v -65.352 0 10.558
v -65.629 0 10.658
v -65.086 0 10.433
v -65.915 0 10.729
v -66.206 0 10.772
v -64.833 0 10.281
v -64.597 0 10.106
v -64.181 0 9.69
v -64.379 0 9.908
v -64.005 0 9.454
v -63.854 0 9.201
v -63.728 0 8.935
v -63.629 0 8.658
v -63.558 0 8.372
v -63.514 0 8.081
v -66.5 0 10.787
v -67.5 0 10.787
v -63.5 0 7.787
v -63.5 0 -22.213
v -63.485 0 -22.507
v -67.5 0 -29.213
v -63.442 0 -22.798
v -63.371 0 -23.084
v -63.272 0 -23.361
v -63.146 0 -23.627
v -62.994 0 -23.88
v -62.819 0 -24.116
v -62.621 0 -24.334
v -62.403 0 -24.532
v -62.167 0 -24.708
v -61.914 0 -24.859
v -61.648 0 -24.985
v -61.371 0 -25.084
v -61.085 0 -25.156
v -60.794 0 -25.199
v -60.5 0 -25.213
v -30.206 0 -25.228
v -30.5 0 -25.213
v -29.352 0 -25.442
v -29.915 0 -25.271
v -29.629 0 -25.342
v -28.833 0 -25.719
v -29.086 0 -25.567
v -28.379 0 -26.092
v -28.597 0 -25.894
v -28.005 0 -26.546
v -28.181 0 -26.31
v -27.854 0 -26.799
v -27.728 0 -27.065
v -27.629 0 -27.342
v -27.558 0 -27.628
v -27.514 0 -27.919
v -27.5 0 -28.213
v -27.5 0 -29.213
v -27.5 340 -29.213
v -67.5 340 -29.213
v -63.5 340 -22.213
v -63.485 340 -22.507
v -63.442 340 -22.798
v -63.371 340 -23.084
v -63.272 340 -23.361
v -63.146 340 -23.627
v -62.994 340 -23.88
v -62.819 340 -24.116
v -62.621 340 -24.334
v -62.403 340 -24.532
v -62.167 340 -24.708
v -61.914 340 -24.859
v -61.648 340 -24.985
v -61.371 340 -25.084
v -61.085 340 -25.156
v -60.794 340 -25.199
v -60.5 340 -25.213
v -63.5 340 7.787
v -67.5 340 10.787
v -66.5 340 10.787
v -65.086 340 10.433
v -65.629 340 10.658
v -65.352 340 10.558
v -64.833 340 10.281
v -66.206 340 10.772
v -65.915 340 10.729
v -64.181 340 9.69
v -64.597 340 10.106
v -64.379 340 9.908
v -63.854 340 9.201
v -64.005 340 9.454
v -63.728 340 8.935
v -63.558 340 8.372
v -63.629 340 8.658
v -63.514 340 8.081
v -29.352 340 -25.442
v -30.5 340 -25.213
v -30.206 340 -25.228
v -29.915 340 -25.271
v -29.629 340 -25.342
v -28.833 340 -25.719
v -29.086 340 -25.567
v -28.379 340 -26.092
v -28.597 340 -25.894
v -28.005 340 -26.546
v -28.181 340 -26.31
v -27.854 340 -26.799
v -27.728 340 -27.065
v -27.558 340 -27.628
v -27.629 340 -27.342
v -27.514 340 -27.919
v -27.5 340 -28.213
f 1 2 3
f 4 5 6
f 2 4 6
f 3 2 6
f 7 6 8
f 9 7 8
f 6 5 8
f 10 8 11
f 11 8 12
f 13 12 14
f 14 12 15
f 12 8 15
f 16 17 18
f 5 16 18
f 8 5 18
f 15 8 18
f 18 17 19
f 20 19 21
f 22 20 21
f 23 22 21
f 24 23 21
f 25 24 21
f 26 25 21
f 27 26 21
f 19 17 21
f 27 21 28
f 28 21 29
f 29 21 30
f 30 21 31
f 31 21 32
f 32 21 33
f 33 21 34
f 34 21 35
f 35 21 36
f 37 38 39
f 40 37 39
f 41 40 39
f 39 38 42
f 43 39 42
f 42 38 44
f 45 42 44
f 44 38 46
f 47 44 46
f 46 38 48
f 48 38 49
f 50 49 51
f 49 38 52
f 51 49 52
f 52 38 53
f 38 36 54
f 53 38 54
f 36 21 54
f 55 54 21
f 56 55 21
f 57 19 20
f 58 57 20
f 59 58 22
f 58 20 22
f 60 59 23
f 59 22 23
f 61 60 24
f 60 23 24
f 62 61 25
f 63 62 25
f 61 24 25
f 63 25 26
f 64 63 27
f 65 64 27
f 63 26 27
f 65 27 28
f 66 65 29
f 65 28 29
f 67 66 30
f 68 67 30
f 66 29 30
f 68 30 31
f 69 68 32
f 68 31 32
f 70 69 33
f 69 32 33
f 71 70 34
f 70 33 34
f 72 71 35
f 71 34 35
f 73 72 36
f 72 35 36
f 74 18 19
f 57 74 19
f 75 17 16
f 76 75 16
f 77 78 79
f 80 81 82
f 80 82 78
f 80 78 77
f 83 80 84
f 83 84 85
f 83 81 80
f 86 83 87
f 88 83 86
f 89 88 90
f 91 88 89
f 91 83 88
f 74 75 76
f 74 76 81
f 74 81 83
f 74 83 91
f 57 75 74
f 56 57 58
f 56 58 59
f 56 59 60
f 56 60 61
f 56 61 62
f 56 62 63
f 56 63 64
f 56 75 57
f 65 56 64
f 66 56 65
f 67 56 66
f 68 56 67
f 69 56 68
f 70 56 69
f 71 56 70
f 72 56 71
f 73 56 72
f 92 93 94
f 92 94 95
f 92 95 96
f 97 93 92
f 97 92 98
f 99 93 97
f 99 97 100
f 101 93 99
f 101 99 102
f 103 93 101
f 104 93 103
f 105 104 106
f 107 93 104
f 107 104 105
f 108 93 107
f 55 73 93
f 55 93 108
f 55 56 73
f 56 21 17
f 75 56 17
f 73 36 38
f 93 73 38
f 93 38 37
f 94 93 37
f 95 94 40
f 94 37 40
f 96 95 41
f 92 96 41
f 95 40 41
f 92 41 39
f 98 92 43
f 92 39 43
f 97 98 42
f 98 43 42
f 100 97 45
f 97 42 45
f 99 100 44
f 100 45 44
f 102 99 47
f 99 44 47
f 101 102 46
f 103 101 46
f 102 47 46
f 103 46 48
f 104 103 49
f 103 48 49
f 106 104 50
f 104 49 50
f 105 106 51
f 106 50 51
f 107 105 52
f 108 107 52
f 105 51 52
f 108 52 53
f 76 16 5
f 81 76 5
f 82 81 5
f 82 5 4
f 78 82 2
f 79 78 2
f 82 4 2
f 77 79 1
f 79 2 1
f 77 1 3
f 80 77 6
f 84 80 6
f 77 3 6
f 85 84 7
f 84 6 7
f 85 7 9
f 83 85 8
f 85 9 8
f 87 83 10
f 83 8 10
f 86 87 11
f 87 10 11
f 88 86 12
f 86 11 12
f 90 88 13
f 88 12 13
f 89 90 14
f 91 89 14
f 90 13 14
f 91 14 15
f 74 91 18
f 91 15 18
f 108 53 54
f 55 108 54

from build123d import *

# Parameters (mm, degrees)
BOSS_EXTRUDE1_DEPTH = 340


with BuildPart() as part:
    # Sketch1 → Boss-Extrude1 (new body)
    with BuildSketch(Plane(origin=(0, 0, 0), x_dir=(1, 0, 0), z_dir=(0, 1, 0))):
        with BuildLine():
            Line((-27.499872145, 29.213153277), (-67.499872145, 29.213153277))
            Line((-67.499872145, 29.213153277), (-67.499872145, -10.786846723))
            Line((-67.499872145, -10.786846723), (-66.499872145, -10.786846723))
            ThreePointArc((-66.499872145, -10.786846723), (-64.378551801, -9.908167067), (-63.499872145, -7.786846723))
            Line((-63.499872145, -7.786846723), (-63.499872145, 22.213153277))
            ThreePointArc((-63.499872145, 22.213153277), (-62.621192489, 24.334473621), (-60.499872145, 25.213153277))
            Line((-60.499872145, 25.213153277), (-30.499872145, 25.213153277))
            ThreePointArc((-30.499872145, 25.213153277), (-28.378551801, 26.091832933), (-27.499872145, 28.213153277))
            Line((-27.499872145, 28.213153277), (-27.499872145, 29.213153277))
        make_face()
    extrude(amount=BOSS_EXTRUDE1_DEPTH)


solid = part.part
